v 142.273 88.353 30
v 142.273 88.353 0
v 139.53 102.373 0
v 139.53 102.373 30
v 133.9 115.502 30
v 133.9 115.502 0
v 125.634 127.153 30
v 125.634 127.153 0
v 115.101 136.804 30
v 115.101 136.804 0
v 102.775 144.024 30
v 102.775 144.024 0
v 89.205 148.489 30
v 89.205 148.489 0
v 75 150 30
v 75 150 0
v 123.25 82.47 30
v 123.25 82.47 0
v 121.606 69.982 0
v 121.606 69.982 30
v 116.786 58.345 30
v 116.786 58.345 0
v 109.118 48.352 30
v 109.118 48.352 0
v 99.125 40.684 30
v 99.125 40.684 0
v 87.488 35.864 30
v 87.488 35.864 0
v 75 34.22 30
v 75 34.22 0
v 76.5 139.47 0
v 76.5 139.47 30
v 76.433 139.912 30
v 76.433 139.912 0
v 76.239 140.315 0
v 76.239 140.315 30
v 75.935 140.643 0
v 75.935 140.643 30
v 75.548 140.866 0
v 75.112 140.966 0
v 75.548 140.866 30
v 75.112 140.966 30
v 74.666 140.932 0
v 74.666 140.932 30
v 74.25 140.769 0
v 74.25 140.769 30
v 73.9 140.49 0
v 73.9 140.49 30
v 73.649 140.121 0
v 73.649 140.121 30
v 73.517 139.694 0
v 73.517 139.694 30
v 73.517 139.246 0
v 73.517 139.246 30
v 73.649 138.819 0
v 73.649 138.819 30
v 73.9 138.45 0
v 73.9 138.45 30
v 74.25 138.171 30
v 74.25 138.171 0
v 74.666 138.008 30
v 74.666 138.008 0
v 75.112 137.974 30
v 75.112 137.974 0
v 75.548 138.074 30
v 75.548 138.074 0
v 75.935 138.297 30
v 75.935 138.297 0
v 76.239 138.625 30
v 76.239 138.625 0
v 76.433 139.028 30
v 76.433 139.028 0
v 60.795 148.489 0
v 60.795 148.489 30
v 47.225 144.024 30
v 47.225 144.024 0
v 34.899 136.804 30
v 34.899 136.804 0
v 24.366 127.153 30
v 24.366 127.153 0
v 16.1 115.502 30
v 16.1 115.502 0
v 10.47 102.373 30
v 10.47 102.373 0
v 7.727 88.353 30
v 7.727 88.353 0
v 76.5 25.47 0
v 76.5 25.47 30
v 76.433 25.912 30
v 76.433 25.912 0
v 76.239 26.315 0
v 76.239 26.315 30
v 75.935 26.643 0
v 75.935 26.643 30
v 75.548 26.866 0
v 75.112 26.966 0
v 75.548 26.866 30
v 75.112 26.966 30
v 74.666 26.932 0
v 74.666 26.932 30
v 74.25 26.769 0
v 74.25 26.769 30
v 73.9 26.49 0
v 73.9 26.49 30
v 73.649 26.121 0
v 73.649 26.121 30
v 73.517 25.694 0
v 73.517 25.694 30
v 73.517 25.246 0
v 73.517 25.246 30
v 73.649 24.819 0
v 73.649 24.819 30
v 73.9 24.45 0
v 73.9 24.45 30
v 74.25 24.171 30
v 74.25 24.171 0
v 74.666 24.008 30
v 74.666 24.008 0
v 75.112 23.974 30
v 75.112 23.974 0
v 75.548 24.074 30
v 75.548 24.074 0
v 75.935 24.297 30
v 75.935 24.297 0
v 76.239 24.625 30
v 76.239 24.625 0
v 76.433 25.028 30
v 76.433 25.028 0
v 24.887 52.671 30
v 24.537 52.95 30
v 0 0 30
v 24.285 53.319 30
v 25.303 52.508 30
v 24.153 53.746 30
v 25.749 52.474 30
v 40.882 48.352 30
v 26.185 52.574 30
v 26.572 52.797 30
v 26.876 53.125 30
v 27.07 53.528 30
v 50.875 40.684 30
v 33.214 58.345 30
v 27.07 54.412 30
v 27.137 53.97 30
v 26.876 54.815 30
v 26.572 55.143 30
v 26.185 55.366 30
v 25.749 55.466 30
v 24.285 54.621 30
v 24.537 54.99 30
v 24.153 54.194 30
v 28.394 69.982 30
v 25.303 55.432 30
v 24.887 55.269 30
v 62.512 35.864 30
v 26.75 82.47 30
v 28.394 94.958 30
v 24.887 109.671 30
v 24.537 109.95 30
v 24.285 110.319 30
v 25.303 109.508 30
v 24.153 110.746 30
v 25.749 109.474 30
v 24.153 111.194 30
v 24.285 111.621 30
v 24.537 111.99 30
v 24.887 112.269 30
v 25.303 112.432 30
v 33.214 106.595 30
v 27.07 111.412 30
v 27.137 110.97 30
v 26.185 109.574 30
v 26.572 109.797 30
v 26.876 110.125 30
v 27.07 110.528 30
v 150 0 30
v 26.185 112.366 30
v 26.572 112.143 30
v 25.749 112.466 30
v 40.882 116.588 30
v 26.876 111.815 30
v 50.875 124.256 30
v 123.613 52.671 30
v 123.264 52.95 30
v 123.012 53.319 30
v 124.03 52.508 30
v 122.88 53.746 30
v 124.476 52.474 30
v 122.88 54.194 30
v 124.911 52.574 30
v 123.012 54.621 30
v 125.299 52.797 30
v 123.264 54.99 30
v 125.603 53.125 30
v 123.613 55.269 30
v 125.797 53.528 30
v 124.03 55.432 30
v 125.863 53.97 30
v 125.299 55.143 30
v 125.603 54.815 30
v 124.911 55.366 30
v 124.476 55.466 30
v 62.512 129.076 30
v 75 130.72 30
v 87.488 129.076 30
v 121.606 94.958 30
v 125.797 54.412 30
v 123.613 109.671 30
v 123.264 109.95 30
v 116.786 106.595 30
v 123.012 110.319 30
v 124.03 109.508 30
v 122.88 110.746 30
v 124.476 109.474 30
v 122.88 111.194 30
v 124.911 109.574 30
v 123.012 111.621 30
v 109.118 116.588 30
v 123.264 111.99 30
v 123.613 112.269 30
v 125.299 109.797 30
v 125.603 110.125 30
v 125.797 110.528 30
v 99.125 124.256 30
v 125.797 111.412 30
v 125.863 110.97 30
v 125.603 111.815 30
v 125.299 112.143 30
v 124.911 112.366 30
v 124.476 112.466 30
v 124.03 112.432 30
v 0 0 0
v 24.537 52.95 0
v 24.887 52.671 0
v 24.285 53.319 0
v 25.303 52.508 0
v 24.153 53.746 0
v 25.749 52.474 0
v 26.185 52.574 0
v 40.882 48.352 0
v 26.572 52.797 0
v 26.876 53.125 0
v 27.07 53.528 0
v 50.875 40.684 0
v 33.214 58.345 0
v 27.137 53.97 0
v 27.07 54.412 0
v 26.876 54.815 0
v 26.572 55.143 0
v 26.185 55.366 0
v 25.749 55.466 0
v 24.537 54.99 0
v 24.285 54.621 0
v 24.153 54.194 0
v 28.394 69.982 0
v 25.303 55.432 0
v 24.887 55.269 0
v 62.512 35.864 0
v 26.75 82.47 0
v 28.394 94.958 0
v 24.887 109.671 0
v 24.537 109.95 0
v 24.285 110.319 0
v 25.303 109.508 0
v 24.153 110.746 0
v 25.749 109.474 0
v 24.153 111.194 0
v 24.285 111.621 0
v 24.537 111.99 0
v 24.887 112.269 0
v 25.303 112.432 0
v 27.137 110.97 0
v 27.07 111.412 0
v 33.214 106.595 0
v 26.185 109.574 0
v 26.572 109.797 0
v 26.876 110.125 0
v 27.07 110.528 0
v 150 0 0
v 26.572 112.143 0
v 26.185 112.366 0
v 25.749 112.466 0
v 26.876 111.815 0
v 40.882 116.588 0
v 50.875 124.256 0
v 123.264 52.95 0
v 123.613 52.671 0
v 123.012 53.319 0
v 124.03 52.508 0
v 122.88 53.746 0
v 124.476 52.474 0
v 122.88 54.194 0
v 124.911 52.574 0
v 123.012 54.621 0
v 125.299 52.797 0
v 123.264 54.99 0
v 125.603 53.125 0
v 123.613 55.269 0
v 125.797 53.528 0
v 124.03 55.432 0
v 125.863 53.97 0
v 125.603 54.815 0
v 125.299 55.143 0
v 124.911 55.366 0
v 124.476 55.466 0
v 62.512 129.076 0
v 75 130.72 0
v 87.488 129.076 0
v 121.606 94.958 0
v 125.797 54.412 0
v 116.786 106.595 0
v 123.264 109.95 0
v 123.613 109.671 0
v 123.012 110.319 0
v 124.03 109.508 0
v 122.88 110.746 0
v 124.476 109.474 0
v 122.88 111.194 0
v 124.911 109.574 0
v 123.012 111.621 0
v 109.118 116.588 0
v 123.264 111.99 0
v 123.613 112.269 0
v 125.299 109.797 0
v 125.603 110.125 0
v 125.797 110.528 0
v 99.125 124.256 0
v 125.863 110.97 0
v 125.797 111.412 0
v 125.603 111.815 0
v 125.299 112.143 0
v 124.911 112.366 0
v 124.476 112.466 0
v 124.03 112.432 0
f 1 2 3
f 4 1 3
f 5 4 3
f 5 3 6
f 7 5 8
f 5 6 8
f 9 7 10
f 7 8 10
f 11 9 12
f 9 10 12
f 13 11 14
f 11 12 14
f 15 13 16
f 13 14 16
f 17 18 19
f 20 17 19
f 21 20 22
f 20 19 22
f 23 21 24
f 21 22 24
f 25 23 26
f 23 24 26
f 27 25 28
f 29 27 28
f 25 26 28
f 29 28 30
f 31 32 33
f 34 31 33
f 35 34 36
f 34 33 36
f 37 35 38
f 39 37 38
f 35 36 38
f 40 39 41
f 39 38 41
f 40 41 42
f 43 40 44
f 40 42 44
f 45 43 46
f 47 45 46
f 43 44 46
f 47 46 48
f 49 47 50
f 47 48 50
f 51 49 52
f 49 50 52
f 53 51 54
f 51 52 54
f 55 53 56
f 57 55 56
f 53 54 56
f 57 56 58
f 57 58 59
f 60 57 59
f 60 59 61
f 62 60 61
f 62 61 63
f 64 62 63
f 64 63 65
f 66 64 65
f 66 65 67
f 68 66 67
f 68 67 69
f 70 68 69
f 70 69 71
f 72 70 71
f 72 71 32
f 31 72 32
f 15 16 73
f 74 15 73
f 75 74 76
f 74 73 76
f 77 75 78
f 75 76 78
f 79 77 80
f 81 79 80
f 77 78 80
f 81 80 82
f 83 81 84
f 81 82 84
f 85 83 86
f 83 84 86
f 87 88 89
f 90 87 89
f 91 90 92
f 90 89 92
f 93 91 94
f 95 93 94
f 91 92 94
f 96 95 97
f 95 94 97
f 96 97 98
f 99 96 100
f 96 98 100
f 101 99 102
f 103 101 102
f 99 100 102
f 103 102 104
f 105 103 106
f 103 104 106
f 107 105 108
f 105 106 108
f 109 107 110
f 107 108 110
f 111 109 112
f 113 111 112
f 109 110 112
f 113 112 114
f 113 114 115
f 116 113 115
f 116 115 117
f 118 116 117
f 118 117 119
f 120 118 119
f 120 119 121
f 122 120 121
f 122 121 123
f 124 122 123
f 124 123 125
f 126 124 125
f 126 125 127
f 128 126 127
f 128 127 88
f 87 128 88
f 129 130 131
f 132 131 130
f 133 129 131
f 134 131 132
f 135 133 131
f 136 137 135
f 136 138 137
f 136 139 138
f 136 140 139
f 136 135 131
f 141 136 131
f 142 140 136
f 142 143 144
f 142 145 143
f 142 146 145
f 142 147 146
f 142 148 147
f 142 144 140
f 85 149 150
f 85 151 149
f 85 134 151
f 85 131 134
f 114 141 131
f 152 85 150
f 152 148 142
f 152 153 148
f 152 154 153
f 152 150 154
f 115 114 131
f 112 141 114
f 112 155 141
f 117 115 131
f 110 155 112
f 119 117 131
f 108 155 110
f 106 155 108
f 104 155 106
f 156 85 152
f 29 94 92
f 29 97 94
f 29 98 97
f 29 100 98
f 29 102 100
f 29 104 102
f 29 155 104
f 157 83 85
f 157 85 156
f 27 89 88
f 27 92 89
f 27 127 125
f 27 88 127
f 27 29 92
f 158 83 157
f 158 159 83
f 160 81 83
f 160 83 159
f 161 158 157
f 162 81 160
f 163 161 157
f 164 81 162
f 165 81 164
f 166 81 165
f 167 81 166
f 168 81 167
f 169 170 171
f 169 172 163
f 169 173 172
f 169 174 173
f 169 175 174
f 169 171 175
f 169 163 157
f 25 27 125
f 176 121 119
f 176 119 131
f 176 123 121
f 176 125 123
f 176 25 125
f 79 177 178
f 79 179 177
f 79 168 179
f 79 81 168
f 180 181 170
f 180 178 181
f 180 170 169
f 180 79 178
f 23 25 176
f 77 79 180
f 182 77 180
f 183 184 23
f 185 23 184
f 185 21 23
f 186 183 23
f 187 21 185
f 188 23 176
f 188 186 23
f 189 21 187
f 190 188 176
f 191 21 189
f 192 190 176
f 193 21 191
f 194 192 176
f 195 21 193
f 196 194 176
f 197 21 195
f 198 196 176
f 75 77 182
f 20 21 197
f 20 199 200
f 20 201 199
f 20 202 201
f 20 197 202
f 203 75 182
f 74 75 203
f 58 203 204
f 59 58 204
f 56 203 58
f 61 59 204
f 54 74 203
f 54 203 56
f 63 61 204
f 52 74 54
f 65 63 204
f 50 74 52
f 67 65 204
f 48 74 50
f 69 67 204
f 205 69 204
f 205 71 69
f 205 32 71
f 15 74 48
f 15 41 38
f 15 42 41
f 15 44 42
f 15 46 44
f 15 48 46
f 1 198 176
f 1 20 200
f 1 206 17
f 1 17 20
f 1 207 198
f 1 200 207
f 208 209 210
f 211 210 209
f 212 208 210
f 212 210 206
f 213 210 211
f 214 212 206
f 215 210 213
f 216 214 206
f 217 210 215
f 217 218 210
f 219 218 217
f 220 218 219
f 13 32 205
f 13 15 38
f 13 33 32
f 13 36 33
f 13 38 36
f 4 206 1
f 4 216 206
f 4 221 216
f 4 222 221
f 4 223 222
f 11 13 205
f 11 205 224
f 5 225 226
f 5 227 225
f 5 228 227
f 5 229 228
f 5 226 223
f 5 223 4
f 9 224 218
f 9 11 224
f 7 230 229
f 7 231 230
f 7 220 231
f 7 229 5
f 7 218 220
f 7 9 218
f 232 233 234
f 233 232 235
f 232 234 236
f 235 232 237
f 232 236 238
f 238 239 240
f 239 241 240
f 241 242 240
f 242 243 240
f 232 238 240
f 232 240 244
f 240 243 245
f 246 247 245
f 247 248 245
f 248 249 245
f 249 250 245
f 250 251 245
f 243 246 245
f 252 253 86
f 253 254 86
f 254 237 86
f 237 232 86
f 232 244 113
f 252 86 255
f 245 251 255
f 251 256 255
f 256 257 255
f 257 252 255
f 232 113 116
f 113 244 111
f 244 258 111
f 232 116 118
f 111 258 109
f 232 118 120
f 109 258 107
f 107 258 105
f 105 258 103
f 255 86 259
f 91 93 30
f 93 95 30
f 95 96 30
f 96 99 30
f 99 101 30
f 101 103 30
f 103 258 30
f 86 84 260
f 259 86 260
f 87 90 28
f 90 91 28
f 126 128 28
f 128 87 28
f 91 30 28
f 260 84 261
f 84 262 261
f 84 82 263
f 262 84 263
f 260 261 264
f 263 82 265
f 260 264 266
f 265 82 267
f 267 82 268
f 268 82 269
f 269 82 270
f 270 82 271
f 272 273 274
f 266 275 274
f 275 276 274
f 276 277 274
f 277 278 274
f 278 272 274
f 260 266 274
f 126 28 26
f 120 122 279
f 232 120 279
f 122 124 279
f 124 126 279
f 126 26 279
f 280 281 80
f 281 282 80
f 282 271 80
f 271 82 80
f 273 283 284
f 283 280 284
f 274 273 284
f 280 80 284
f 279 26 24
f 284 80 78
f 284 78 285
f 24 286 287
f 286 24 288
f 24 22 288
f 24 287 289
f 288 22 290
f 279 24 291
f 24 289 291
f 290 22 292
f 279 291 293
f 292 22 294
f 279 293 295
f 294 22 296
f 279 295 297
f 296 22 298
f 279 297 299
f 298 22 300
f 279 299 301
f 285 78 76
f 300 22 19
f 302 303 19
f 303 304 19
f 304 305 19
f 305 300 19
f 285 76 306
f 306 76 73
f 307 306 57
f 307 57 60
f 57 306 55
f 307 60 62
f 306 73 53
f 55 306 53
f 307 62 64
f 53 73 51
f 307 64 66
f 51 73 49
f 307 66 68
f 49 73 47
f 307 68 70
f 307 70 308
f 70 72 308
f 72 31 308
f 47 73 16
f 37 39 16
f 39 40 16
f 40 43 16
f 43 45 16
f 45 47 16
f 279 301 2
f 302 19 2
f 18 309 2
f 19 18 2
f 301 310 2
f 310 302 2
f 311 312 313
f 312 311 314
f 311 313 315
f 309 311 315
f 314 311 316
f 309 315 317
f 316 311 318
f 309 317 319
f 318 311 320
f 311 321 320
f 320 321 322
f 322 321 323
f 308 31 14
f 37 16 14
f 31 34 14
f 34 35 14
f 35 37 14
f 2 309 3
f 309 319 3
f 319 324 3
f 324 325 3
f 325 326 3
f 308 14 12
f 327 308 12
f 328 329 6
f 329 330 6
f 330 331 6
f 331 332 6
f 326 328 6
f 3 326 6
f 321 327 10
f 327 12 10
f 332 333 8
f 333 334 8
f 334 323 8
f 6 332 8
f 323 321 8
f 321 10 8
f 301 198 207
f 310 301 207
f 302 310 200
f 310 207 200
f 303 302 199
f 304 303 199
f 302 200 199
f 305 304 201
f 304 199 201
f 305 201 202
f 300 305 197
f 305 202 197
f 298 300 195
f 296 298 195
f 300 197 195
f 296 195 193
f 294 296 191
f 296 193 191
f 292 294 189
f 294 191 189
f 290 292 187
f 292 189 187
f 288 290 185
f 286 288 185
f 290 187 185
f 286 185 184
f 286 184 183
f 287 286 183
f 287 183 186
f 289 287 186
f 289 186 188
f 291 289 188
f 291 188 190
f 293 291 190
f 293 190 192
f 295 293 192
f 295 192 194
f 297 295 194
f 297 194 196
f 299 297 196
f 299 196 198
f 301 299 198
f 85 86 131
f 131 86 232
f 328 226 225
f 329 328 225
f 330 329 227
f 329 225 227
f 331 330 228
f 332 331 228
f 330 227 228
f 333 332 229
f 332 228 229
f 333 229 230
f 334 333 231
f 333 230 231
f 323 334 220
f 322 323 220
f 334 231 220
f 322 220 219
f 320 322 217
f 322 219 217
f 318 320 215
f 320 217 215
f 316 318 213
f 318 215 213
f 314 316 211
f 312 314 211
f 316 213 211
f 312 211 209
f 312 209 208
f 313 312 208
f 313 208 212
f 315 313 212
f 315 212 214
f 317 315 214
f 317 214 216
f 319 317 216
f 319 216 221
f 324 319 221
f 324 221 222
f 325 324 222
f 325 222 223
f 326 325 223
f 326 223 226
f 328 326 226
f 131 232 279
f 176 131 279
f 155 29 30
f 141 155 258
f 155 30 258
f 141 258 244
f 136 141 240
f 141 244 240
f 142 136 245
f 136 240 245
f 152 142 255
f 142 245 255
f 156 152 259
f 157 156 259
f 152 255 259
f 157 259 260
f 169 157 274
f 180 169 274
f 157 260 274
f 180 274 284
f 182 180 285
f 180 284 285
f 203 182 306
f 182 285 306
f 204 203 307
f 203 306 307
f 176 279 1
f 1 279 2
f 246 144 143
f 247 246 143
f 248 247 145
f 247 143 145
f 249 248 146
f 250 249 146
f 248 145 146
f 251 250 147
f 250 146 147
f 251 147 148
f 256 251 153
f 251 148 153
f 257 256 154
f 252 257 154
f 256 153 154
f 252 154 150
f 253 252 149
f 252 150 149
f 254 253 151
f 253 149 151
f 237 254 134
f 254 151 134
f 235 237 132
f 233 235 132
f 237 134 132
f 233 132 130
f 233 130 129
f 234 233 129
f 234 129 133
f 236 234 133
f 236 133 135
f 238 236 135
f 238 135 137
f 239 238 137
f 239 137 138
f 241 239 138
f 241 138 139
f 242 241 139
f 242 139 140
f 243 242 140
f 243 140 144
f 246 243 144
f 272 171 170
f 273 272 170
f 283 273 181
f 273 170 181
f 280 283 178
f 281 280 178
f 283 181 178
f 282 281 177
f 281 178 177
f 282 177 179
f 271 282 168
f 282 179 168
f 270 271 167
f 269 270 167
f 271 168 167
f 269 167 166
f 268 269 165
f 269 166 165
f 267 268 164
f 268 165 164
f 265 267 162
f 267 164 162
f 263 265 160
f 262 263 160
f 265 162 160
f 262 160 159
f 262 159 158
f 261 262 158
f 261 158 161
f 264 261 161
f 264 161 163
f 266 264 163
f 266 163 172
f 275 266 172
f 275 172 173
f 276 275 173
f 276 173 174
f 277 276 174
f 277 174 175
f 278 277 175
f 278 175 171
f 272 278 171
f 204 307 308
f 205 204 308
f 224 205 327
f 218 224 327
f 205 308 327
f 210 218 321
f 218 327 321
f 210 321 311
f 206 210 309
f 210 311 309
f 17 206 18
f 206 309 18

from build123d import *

# Parameters (mm, degrees)
EXTRUDE_1_DEPTH     = 30
CUT_EXTRUDE_1_REACH = 216.243
SKETCH_2_R          = 1.5


with BuildPart() as part:
    # 草图1 → 凸台-拉伸1 (new body)
    with BuildSketch(Plane.XY):
        with BuildLine():
            Line((7.726793577, 88.353296402), (0, 0))
            Line((0, 0), (75, 0))
            Line((75, 0), (75, 34.220027747))
            ThreePointArc((75, 34.220027747), (26.75, 82.470027747), (75, 130.720027747))
            Line((75, 130.720027747), (75, 150))
            ThreePointArc((75, 150), (29.376540117, 132.257546873), (7.726793577, 88.353296402))
        make_face()
        with BuildLine():
            Line((75, 34.220027747), (75, 0))
            Line((75, 0), (150, 0))
            Line((150, 0), (142.273206423, 88.353296402))
            ThreePointArc((142.273206423, 88.353296402), (120.623459883, 132.257546873), (75, 150))
            Line((75, 150), (75, 130.720027747))
            ThreePointArc((75, 130.720027747), (109.117902192, 116.587929939), (123.25, 82.470027747))
            ThreePointArc((123.25, 82.470027747), (109.117902192, 48.352125555), (75, 34.220027747))
        make_face()
    extrude(amount=EXTRUDE_1_DEPTH)

    # 草图2 → 切除-拉伸1 (cut, up to next)
    with BuildSketch(Plane.XY.offset(30), mode=Mode.PRIVATE) as cut_extrude_1_sk1:
        with Locations((75, 139.470027747)):
            Circle(SKETCH_2_R)
    cut_extrude_1_tool1 = extrude(cut_extrude_1_sk1.sketch, amount=-CUT_EXTRUDE_1_REACH, mode=Mode.PRIVATE) & part.part
    # 草图2 → 切除-拉伸1 (cut, up to next)
    with BuildSketch(Plane.XY.offset(30), mode=Mode.PRIVATE) as cut_extrude_1_sk2:
        with Locations((124.363448016, 110.970027747)):
            Circle(SKETCH_2_R)
    cut_extrude_1_tool2 = extrude(cut_extrude_1_sk2.sketch, amount=-CUT_EXTRUDE_1_REACH, mode=Mode.PRIVATE) & part.part
    # 草图2 → 切除-拉伸1 (cut, up to next)
    with BuildSketch(Plane.XY.offset(30), mode=Mode.PRIVATE) as cut_extrude_1_sk3:
        with Locations((124.363448016, 53.970027747)):
            Circle(SKETCH_2_R)
    cut_extrude_1_tool3 = extrude(cut_extrude_1_sk3.sketch, amount=-CUT_EXTRUDE_1_REACH, mode=Mode.PRIVATE) & part.part
    # 草图2 → 切除-拉伸1 (cut, up to next)
    with BuildSketch(Plane.XY.offset(30), mode=Mode.PRIVATE) as cut_extrude_1_sk4:
        with Locations((75, 25.470027747)):
            Circle(SKETCH_2_R)
    cut_extrude_1_tool4 = extrude(cut_extrude_1_sk4.sketch, amount=-CUT_EXTRUDE_1_REACH, mode=Mode.PRIVATE) & part.part
    # 草图2 → 切除-拉伸1 (cut, up to next)
    with BuildSketch(Plane.XY.offset(30), mode=Mode.PRIVATE) as cut_extrude_1_sk5:
        with Locations((25.636551984, 53.970027747)):
            Circle(SKETCH_2_R)
    cut_extrude_1_tool5 = extrude(cut_extrude_1_sk5.sketch, amount=-CUT_EXTRUDE_1_REACH, mode=Mode.PRIVATE) & part.part
    # 草图2 → 切除-拉伸1 (cut, up to next)
    with BuildSketch(Plane.XY.offset(30), mode=Mode.PRIVATE) as cut_extrude_1_sk6:
        with Locations((25.636551984, 110.970027747)):
            Circle(SKETCH_2_R)
    cut_extrude_1_tool6 = extrude(cut_extrude_1_sk6.sketch, amount=-CUT_EXTRUDE_1_REACH, mode=Mode.PRIVATE) & part.part
    add(cut_extrude_1_tool1.solids().sort_by_distance((75, 139.470028, 30))[0], mode=Mode.SUBTRACT)
    add(cut_extrude_1_tool2.solids().sort_by_distance((124.363448, 110.970028, 30))[0], mode=Mode.SUBTRACT)
    add(cut_extrude_1_tool3.solids().sort_by_distance((124.363448, 53.970028, 30))[0], mode=Mode.SUBTRACT)
    add(cut_extrude_1_tool4.solids().sort_by_distance((75, 25.470028, 30))[0], mode=Mode.SUBTRACT)
    add(cut_extrude_1_tool5.solids().sort_by_distance((25.636552, 53.970028, 30))[0], mode=Mode.SUBTRACT)
    add(cut_extrude_1_tool6.solids().sort_by_distance((25.636552, 110.970028, 30))[0], mode=Mode.SUBTRACT)


solid = part.part
